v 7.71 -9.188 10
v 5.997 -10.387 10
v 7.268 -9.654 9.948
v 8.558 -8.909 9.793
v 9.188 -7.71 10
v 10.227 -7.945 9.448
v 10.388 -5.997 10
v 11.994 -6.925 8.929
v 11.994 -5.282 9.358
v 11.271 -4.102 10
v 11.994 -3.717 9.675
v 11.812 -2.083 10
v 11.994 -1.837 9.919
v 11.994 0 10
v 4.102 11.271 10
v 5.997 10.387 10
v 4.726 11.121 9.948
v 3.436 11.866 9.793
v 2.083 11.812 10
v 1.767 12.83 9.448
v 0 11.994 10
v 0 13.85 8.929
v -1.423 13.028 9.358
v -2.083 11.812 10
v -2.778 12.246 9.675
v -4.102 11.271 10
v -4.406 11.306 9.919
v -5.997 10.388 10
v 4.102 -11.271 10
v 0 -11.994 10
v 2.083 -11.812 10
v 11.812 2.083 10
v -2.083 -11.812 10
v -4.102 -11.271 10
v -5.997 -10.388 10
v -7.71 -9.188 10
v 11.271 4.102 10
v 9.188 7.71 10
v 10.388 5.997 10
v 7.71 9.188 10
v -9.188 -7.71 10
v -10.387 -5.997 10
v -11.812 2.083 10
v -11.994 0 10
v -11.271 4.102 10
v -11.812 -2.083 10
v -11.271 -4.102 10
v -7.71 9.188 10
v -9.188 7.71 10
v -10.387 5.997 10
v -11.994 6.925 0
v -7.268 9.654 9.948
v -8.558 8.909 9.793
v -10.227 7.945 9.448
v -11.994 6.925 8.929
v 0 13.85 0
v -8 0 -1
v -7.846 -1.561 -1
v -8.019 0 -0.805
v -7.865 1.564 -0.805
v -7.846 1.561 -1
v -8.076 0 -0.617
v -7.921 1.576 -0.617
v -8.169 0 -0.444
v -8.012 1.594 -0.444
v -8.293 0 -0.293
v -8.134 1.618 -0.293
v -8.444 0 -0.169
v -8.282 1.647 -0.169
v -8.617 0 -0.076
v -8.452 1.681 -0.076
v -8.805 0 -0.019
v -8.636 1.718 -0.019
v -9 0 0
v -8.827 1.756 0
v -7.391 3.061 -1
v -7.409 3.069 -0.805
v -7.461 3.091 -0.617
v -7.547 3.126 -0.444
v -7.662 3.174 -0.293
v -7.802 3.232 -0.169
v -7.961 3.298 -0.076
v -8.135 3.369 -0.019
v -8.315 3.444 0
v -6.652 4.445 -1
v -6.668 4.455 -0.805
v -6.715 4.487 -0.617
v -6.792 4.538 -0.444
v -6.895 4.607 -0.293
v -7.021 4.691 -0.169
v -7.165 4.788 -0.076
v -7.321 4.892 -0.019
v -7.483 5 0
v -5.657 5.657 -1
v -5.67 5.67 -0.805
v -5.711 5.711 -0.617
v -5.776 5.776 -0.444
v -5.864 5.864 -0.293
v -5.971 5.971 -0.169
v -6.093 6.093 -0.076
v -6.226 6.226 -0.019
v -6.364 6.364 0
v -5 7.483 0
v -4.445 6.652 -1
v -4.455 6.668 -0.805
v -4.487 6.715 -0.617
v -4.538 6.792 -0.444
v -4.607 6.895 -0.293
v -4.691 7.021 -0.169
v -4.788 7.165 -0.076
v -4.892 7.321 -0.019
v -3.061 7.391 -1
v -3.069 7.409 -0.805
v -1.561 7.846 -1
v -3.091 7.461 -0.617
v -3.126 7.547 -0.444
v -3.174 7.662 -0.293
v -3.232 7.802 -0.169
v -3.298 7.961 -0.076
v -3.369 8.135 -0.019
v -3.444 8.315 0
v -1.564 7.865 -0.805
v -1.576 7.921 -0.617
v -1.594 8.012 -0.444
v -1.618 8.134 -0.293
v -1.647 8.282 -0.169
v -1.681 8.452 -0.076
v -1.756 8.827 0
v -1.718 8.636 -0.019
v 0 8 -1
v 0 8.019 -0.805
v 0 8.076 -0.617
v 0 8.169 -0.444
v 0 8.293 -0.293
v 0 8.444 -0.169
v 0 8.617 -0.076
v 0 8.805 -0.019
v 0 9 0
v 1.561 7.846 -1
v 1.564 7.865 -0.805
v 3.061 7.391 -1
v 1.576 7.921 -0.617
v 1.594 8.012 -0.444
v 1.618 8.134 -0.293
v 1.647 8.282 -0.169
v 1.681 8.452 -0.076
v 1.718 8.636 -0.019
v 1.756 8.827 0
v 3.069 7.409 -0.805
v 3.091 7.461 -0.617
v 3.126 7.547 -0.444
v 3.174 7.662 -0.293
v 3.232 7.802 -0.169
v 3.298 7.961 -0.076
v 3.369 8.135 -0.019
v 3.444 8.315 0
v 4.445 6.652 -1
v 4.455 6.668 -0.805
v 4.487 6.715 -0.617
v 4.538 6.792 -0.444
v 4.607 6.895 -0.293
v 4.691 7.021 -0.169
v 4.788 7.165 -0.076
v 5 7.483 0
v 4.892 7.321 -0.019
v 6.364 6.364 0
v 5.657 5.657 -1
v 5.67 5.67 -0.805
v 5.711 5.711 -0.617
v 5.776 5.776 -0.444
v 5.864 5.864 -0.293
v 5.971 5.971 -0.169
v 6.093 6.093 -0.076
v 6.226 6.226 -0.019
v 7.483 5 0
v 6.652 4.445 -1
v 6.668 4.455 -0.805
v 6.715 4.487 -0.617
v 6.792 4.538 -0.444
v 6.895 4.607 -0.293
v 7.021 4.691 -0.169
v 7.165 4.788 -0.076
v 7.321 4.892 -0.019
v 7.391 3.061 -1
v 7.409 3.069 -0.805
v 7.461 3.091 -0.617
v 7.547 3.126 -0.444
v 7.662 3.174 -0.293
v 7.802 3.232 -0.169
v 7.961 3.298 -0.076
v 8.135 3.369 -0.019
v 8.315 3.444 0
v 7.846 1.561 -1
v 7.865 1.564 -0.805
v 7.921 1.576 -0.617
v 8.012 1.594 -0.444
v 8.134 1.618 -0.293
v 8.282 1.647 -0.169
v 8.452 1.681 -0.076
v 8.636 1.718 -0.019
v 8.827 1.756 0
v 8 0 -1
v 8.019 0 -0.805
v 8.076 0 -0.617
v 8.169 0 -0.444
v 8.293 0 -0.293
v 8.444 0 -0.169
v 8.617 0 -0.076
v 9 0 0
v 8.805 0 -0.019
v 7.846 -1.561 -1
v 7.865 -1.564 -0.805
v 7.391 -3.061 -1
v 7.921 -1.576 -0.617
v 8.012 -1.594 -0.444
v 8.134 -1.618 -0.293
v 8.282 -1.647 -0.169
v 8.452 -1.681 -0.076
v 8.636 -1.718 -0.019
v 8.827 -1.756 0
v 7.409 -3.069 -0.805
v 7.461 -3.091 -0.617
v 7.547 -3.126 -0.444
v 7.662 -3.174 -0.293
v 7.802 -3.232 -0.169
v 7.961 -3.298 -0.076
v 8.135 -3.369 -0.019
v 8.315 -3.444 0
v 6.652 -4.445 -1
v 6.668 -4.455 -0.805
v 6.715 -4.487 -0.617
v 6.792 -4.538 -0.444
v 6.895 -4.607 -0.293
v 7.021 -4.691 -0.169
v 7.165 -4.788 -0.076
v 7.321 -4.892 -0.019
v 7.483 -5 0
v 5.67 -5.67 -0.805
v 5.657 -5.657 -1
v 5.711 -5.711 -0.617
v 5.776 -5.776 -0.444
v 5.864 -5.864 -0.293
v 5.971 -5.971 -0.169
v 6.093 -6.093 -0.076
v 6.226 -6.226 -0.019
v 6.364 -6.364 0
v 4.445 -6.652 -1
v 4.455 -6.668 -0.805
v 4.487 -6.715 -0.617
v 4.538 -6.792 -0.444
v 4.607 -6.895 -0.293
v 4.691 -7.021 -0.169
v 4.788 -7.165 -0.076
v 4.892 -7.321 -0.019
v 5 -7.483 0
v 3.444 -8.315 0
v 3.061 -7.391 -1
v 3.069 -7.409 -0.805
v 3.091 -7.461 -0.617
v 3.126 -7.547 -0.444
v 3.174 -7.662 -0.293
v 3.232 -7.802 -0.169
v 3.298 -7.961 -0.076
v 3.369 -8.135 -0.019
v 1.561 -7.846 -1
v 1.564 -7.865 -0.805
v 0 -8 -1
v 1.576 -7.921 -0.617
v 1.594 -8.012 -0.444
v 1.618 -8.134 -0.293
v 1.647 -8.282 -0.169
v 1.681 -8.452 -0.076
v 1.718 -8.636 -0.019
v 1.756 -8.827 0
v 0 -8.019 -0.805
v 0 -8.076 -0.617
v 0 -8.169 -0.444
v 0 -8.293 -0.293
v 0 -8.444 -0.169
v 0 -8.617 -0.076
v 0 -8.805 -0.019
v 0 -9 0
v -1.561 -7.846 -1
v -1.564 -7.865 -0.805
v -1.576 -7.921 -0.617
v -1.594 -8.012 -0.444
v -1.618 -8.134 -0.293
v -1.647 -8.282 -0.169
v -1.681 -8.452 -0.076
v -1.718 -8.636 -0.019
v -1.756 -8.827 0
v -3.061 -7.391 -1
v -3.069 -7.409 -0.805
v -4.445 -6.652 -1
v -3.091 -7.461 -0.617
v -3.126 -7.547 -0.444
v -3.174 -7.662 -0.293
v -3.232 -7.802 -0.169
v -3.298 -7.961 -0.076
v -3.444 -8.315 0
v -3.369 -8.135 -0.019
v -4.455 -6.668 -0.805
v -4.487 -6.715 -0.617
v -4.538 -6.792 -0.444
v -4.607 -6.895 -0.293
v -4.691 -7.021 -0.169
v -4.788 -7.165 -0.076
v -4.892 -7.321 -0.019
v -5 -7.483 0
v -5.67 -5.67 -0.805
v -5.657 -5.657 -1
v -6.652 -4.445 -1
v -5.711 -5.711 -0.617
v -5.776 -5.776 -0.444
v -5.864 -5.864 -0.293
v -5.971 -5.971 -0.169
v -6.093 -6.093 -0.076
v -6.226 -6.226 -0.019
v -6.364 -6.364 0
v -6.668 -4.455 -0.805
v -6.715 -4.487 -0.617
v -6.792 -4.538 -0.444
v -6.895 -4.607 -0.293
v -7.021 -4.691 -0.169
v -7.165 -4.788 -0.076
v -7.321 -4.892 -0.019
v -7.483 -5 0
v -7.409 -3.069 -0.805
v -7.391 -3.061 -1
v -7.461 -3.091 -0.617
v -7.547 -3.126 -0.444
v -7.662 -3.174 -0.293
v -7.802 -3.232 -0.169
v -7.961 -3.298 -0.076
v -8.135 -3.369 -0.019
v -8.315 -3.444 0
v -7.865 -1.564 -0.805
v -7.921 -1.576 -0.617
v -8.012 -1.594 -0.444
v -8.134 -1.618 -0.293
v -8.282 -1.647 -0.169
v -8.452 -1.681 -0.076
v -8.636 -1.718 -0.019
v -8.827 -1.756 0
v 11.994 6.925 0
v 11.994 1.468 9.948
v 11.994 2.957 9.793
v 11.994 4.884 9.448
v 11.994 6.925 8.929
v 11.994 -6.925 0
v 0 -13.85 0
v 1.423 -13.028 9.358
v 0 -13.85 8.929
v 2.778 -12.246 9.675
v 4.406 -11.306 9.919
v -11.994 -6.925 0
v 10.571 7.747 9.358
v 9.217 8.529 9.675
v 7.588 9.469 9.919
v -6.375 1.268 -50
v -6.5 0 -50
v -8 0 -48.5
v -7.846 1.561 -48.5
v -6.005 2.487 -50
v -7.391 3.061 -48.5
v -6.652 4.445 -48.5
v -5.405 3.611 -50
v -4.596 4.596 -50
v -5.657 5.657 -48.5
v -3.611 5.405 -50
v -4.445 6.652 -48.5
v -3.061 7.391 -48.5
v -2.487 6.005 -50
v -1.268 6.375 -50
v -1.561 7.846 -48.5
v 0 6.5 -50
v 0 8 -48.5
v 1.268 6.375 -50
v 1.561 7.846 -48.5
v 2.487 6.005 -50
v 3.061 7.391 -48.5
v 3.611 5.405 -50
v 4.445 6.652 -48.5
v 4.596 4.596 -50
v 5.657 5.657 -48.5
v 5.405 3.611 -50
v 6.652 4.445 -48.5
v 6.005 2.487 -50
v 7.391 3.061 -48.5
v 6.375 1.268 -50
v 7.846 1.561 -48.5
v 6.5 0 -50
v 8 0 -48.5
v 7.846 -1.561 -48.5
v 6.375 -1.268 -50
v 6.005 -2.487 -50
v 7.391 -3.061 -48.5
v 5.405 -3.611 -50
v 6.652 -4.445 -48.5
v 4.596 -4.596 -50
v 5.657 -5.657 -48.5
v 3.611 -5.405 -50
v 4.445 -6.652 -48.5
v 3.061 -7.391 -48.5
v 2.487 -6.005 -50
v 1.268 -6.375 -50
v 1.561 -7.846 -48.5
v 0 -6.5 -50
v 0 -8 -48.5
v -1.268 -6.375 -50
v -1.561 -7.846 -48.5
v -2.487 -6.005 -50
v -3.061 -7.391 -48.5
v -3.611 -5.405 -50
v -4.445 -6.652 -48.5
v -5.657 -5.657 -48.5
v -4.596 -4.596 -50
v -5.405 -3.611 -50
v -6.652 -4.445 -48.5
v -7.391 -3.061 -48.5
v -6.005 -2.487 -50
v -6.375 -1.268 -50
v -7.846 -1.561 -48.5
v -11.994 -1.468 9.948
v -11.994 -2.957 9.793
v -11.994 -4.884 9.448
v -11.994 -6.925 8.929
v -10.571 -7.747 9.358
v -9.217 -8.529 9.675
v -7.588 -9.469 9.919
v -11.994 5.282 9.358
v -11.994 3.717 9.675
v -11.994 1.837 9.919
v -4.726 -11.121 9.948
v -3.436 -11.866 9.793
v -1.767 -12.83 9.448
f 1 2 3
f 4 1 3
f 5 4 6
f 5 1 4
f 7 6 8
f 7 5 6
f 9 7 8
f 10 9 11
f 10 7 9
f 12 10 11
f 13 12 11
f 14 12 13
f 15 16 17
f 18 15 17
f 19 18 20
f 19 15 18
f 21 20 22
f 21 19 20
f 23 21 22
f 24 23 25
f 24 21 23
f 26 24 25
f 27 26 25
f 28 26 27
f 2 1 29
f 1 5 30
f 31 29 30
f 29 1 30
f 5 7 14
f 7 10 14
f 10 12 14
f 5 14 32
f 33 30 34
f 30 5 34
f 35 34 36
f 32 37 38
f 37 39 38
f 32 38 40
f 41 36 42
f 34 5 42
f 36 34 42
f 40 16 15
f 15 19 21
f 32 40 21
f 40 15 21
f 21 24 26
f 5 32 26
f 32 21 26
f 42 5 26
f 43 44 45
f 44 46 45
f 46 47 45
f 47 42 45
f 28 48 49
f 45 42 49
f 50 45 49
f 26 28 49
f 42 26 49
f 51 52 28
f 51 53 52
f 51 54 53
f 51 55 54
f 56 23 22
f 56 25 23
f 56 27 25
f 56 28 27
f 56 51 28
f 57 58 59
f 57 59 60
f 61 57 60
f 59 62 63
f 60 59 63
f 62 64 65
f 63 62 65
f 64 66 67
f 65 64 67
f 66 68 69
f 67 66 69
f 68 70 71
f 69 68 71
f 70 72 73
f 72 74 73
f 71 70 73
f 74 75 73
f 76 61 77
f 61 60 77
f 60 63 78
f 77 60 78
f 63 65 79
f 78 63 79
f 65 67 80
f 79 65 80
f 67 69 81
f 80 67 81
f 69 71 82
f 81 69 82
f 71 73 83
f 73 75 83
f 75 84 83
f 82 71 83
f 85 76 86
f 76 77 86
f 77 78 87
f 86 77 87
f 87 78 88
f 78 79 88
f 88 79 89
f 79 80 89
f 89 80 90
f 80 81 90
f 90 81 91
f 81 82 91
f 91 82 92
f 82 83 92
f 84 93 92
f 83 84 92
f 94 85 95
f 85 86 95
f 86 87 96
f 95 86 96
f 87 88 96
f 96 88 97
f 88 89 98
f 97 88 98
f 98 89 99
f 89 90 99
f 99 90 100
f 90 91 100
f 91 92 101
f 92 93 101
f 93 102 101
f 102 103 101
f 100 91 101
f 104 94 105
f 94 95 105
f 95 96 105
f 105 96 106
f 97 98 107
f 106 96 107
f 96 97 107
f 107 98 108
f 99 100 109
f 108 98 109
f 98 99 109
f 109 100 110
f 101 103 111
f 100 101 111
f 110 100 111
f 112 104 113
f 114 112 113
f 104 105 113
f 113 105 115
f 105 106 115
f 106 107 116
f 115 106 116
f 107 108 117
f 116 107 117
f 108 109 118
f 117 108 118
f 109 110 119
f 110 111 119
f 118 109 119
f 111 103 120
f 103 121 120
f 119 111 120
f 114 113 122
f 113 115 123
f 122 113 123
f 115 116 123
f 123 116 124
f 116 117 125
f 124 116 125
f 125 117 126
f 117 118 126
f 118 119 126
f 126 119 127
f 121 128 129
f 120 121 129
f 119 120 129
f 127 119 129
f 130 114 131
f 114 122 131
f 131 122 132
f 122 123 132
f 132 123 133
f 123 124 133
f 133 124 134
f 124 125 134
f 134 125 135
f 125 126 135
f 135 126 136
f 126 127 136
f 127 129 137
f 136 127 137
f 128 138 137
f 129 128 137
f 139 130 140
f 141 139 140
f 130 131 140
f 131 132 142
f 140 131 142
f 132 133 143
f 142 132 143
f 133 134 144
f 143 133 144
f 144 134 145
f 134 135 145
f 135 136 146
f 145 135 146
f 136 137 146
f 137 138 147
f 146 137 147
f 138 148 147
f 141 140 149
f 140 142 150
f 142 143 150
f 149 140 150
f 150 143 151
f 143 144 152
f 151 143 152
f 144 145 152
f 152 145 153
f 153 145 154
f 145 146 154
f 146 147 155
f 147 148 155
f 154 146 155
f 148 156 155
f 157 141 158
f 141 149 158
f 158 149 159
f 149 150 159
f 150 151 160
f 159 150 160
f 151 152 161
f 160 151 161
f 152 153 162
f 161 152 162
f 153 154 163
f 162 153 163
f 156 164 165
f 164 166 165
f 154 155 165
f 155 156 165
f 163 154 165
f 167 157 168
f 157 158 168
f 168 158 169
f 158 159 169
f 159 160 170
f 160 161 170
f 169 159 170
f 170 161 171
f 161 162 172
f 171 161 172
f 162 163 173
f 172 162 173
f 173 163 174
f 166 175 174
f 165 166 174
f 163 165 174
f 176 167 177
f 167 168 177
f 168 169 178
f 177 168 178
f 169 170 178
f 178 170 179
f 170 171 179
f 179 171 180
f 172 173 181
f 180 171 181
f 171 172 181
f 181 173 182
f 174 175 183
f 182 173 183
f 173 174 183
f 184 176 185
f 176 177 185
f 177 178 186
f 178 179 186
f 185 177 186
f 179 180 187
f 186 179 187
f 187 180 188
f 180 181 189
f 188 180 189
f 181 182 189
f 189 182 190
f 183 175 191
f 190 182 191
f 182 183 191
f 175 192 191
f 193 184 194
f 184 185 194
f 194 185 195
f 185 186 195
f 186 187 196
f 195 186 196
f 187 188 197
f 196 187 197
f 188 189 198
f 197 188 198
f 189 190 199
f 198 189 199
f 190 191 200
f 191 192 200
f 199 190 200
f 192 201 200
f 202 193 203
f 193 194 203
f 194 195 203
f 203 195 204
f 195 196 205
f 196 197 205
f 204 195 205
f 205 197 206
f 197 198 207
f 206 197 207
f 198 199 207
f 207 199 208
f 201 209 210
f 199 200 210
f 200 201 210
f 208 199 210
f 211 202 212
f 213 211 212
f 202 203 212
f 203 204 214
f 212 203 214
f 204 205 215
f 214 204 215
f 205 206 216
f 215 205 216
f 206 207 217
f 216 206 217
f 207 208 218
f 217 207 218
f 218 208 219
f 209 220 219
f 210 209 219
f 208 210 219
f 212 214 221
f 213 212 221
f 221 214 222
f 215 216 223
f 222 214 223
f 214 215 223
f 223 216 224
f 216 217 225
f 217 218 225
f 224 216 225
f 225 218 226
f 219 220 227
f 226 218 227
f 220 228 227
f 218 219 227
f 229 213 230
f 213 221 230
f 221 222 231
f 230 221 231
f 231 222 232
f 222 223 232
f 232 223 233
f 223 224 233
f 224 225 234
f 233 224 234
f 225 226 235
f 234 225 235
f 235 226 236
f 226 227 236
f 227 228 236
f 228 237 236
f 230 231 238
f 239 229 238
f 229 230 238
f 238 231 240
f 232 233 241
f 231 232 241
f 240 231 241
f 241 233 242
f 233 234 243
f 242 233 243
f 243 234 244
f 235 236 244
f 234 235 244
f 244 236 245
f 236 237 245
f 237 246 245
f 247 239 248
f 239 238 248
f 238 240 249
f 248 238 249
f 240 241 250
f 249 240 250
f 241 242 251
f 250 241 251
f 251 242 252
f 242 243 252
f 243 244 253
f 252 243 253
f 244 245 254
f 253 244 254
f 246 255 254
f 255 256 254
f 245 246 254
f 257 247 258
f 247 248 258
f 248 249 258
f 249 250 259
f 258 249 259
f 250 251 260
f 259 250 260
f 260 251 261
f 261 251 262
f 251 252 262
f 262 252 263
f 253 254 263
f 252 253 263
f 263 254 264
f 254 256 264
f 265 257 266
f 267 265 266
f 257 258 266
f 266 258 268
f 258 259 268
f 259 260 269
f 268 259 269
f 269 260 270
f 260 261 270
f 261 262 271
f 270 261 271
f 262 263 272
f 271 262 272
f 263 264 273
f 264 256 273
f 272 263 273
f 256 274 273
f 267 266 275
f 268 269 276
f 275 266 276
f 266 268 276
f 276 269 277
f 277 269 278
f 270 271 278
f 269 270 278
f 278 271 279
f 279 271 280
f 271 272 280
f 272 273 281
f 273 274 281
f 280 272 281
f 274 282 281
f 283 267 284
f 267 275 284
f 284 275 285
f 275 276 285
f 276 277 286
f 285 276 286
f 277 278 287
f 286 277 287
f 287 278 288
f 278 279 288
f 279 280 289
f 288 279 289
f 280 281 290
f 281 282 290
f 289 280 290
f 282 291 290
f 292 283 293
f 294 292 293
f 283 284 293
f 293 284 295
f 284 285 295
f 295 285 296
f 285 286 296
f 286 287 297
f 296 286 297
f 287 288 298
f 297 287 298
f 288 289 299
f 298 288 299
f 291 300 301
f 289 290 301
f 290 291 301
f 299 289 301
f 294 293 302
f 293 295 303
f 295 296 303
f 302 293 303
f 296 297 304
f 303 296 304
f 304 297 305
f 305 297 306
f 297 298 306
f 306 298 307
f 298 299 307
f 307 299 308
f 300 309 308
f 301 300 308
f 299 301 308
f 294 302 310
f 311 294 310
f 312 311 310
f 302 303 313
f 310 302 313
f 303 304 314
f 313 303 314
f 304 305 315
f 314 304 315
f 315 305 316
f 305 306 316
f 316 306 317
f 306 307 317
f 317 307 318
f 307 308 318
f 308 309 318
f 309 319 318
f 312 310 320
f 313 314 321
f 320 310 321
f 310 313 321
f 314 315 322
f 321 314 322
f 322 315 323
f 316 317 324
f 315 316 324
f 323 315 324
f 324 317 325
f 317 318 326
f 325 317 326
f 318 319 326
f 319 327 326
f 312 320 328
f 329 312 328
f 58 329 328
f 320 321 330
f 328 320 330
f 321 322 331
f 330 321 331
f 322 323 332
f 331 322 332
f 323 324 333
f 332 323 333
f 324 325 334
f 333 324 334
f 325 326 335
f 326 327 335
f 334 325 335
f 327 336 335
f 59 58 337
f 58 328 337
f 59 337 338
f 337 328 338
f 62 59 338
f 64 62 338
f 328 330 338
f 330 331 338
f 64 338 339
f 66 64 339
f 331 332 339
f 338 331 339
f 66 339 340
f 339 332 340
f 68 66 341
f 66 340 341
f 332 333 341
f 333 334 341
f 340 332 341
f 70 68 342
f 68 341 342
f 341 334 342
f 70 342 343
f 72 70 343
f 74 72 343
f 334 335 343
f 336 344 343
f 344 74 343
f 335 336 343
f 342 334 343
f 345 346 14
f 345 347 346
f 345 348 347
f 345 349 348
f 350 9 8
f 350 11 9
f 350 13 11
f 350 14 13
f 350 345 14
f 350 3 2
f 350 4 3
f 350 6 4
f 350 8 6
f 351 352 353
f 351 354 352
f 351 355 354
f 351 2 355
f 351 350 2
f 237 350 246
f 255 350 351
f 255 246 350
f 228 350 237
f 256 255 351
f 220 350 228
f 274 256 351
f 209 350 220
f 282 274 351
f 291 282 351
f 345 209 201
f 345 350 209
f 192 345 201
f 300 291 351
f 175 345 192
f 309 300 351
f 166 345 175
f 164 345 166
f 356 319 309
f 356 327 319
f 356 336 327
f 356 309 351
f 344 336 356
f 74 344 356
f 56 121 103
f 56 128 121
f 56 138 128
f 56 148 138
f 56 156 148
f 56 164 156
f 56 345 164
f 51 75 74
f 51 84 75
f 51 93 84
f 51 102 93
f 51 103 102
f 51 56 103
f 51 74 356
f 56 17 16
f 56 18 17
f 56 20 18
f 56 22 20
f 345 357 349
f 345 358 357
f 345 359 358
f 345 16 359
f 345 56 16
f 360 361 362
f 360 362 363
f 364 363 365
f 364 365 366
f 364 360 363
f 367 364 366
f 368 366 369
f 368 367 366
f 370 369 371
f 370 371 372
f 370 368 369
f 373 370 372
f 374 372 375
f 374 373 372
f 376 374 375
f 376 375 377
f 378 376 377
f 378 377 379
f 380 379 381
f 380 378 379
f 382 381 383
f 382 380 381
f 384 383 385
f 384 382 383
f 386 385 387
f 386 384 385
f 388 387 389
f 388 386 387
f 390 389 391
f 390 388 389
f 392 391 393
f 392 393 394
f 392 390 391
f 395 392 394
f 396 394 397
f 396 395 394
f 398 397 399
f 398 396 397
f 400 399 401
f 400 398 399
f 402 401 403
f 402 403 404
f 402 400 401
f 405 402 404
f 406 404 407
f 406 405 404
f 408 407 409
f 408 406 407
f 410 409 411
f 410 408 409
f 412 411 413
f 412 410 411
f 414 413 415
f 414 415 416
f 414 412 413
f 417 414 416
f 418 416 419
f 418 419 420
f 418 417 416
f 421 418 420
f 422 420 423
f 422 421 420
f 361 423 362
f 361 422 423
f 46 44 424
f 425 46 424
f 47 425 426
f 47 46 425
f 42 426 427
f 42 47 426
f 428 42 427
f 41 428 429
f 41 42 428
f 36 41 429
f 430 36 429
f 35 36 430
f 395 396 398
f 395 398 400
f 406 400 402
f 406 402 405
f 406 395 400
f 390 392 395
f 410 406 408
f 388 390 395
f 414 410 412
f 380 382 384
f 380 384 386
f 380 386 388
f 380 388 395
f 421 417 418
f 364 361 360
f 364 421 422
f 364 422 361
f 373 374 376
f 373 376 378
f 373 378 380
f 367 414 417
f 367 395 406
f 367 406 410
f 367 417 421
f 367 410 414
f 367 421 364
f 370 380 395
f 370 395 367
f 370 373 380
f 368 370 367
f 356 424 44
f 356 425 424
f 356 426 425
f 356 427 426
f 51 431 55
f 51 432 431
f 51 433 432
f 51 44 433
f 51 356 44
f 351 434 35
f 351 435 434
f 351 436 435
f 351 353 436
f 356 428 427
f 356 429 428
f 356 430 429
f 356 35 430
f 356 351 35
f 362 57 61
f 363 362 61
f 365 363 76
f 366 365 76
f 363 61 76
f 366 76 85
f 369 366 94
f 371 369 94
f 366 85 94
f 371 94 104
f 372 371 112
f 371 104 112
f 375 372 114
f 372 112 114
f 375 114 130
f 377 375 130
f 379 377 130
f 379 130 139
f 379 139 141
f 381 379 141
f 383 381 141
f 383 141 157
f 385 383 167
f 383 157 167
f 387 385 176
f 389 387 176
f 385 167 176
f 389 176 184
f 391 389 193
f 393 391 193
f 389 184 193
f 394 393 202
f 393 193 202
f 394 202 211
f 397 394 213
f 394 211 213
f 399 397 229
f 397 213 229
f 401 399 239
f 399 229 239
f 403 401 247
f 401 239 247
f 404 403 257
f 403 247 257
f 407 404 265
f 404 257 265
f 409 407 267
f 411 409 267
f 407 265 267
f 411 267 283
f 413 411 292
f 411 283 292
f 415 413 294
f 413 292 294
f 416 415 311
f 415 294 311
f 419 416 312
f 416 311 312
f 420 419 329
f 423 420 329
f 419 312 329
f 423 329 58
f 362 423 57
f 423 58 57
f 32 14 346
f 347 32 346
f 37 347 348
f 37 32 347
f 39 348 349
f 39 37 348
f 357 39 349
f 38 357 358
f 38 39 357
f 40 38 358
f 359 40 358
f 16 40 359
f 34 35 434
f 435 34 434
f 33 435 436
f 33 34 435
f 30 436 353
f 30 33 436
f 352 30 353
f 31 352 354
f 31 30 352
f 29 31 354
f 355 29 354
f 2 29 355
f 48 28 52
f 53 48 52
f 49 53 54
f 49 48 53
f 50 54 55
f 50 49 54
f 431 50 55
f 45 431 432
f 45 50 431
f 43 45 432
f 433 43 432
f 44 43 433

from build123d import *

# Parameters (mm, degrees)
EXTRUDE_376_DEPTH   = 10
SKETCH_2_OUTSIDE_W  = 172.148
SKETCH_2_OUTSIDE_H  = 175.86
SKETCH_2_OUTSIDE_R  = 11.994451842
CUT_EXTRUDE_1_DEPTH = 40
CUT_EXTRUDE_1_DRAFT = -60
SKETCH_3_R          = 8
EXTRUDE_1_DEPTH     = 50
CHAMFER_1_SIZE      = 1.5
FILLET_1_R          = 1


with BuildPart() as part:
    # Эскиз1 → Extrude 376 (new body)
    with BuildSketch(Plane.XY):
        Polygon((-11.994451842, 6.925), (0, 13.85), (11.994451842, 6.925), (11.994451842, -6.925), (0, -13.85), (-11.994451842, -6.925), align=None)
    extrude(amount=EXTRUDE_376_DEPTH)


with BuildPart() as cut_extrude_1_tool:
    # Эскиз2 outside → Вырез-Вытянуть1 (with draft: the straight prism first)
    with BuildSketch(Plane.XY.offset(10)):
        Rectangle(SKETCH_2_OUTSIDE_W, SKETCH_2_OUTSIDE_H)
        Circle(SKETCH_2_OUTSIDE_R, mode=Mode.SUBTRACT)
    extrude(amount=-CUT_EXTRUDE_1_DEPTH)
    # Вырез-Вытянуть1: the draft: its side faces are tilted about the plane it starts from
    cut_extrude_1_sides = [cut_extrude_1_tool.faces().sort_by_distance(p)[0] for p in [
        (0, -87.93, -10),
        (86.074, 0, -10),
        (0, 87.93, -10),
        (-86.074, 0, -10),
        (-11.994451842, 0, -10),
    ]]
    draft(cut_extrude_1_sides, Plane.XY.offset(10), CUT_EXTRUDE_1_DRAFT)


with BuildPart() as part_1:
    add(part.part)

    # Вырез-Вытянуть1: cut by cut_extrude_1_tool
    add(cut_extrude_1_tool.part, mode=Mode.SUBTRACT)

    # Эскиз3 → Бобышка-Вытянуть1 (add)
    with BuildSketch(Plane(origin=(0, 0, 0), x_dir=(-1, 0, 0), z_dir=(0, 0, -1))):
        Circle(SKETCH_3_R)
    extrude(amount=EXTRUDE_1_DEPTH)

    # Фаска1
    chamfer_1_edges = [part_1.edges().sort_by_distance(p)[0] for p in [
        (8, 0, -50),
    ]]
    chamfer(chamfer_1_edges, length=CHAMFER_1_SIZE)

    # Скругление1
    fillet_1_edges = [part_1.edges().sort_by_distance(p)[0] for p in [
        (8, 0, 0),
    ]]
    fillet(fillet_1_edges, radius=FILLET_1_R)


solid = part_1.part
